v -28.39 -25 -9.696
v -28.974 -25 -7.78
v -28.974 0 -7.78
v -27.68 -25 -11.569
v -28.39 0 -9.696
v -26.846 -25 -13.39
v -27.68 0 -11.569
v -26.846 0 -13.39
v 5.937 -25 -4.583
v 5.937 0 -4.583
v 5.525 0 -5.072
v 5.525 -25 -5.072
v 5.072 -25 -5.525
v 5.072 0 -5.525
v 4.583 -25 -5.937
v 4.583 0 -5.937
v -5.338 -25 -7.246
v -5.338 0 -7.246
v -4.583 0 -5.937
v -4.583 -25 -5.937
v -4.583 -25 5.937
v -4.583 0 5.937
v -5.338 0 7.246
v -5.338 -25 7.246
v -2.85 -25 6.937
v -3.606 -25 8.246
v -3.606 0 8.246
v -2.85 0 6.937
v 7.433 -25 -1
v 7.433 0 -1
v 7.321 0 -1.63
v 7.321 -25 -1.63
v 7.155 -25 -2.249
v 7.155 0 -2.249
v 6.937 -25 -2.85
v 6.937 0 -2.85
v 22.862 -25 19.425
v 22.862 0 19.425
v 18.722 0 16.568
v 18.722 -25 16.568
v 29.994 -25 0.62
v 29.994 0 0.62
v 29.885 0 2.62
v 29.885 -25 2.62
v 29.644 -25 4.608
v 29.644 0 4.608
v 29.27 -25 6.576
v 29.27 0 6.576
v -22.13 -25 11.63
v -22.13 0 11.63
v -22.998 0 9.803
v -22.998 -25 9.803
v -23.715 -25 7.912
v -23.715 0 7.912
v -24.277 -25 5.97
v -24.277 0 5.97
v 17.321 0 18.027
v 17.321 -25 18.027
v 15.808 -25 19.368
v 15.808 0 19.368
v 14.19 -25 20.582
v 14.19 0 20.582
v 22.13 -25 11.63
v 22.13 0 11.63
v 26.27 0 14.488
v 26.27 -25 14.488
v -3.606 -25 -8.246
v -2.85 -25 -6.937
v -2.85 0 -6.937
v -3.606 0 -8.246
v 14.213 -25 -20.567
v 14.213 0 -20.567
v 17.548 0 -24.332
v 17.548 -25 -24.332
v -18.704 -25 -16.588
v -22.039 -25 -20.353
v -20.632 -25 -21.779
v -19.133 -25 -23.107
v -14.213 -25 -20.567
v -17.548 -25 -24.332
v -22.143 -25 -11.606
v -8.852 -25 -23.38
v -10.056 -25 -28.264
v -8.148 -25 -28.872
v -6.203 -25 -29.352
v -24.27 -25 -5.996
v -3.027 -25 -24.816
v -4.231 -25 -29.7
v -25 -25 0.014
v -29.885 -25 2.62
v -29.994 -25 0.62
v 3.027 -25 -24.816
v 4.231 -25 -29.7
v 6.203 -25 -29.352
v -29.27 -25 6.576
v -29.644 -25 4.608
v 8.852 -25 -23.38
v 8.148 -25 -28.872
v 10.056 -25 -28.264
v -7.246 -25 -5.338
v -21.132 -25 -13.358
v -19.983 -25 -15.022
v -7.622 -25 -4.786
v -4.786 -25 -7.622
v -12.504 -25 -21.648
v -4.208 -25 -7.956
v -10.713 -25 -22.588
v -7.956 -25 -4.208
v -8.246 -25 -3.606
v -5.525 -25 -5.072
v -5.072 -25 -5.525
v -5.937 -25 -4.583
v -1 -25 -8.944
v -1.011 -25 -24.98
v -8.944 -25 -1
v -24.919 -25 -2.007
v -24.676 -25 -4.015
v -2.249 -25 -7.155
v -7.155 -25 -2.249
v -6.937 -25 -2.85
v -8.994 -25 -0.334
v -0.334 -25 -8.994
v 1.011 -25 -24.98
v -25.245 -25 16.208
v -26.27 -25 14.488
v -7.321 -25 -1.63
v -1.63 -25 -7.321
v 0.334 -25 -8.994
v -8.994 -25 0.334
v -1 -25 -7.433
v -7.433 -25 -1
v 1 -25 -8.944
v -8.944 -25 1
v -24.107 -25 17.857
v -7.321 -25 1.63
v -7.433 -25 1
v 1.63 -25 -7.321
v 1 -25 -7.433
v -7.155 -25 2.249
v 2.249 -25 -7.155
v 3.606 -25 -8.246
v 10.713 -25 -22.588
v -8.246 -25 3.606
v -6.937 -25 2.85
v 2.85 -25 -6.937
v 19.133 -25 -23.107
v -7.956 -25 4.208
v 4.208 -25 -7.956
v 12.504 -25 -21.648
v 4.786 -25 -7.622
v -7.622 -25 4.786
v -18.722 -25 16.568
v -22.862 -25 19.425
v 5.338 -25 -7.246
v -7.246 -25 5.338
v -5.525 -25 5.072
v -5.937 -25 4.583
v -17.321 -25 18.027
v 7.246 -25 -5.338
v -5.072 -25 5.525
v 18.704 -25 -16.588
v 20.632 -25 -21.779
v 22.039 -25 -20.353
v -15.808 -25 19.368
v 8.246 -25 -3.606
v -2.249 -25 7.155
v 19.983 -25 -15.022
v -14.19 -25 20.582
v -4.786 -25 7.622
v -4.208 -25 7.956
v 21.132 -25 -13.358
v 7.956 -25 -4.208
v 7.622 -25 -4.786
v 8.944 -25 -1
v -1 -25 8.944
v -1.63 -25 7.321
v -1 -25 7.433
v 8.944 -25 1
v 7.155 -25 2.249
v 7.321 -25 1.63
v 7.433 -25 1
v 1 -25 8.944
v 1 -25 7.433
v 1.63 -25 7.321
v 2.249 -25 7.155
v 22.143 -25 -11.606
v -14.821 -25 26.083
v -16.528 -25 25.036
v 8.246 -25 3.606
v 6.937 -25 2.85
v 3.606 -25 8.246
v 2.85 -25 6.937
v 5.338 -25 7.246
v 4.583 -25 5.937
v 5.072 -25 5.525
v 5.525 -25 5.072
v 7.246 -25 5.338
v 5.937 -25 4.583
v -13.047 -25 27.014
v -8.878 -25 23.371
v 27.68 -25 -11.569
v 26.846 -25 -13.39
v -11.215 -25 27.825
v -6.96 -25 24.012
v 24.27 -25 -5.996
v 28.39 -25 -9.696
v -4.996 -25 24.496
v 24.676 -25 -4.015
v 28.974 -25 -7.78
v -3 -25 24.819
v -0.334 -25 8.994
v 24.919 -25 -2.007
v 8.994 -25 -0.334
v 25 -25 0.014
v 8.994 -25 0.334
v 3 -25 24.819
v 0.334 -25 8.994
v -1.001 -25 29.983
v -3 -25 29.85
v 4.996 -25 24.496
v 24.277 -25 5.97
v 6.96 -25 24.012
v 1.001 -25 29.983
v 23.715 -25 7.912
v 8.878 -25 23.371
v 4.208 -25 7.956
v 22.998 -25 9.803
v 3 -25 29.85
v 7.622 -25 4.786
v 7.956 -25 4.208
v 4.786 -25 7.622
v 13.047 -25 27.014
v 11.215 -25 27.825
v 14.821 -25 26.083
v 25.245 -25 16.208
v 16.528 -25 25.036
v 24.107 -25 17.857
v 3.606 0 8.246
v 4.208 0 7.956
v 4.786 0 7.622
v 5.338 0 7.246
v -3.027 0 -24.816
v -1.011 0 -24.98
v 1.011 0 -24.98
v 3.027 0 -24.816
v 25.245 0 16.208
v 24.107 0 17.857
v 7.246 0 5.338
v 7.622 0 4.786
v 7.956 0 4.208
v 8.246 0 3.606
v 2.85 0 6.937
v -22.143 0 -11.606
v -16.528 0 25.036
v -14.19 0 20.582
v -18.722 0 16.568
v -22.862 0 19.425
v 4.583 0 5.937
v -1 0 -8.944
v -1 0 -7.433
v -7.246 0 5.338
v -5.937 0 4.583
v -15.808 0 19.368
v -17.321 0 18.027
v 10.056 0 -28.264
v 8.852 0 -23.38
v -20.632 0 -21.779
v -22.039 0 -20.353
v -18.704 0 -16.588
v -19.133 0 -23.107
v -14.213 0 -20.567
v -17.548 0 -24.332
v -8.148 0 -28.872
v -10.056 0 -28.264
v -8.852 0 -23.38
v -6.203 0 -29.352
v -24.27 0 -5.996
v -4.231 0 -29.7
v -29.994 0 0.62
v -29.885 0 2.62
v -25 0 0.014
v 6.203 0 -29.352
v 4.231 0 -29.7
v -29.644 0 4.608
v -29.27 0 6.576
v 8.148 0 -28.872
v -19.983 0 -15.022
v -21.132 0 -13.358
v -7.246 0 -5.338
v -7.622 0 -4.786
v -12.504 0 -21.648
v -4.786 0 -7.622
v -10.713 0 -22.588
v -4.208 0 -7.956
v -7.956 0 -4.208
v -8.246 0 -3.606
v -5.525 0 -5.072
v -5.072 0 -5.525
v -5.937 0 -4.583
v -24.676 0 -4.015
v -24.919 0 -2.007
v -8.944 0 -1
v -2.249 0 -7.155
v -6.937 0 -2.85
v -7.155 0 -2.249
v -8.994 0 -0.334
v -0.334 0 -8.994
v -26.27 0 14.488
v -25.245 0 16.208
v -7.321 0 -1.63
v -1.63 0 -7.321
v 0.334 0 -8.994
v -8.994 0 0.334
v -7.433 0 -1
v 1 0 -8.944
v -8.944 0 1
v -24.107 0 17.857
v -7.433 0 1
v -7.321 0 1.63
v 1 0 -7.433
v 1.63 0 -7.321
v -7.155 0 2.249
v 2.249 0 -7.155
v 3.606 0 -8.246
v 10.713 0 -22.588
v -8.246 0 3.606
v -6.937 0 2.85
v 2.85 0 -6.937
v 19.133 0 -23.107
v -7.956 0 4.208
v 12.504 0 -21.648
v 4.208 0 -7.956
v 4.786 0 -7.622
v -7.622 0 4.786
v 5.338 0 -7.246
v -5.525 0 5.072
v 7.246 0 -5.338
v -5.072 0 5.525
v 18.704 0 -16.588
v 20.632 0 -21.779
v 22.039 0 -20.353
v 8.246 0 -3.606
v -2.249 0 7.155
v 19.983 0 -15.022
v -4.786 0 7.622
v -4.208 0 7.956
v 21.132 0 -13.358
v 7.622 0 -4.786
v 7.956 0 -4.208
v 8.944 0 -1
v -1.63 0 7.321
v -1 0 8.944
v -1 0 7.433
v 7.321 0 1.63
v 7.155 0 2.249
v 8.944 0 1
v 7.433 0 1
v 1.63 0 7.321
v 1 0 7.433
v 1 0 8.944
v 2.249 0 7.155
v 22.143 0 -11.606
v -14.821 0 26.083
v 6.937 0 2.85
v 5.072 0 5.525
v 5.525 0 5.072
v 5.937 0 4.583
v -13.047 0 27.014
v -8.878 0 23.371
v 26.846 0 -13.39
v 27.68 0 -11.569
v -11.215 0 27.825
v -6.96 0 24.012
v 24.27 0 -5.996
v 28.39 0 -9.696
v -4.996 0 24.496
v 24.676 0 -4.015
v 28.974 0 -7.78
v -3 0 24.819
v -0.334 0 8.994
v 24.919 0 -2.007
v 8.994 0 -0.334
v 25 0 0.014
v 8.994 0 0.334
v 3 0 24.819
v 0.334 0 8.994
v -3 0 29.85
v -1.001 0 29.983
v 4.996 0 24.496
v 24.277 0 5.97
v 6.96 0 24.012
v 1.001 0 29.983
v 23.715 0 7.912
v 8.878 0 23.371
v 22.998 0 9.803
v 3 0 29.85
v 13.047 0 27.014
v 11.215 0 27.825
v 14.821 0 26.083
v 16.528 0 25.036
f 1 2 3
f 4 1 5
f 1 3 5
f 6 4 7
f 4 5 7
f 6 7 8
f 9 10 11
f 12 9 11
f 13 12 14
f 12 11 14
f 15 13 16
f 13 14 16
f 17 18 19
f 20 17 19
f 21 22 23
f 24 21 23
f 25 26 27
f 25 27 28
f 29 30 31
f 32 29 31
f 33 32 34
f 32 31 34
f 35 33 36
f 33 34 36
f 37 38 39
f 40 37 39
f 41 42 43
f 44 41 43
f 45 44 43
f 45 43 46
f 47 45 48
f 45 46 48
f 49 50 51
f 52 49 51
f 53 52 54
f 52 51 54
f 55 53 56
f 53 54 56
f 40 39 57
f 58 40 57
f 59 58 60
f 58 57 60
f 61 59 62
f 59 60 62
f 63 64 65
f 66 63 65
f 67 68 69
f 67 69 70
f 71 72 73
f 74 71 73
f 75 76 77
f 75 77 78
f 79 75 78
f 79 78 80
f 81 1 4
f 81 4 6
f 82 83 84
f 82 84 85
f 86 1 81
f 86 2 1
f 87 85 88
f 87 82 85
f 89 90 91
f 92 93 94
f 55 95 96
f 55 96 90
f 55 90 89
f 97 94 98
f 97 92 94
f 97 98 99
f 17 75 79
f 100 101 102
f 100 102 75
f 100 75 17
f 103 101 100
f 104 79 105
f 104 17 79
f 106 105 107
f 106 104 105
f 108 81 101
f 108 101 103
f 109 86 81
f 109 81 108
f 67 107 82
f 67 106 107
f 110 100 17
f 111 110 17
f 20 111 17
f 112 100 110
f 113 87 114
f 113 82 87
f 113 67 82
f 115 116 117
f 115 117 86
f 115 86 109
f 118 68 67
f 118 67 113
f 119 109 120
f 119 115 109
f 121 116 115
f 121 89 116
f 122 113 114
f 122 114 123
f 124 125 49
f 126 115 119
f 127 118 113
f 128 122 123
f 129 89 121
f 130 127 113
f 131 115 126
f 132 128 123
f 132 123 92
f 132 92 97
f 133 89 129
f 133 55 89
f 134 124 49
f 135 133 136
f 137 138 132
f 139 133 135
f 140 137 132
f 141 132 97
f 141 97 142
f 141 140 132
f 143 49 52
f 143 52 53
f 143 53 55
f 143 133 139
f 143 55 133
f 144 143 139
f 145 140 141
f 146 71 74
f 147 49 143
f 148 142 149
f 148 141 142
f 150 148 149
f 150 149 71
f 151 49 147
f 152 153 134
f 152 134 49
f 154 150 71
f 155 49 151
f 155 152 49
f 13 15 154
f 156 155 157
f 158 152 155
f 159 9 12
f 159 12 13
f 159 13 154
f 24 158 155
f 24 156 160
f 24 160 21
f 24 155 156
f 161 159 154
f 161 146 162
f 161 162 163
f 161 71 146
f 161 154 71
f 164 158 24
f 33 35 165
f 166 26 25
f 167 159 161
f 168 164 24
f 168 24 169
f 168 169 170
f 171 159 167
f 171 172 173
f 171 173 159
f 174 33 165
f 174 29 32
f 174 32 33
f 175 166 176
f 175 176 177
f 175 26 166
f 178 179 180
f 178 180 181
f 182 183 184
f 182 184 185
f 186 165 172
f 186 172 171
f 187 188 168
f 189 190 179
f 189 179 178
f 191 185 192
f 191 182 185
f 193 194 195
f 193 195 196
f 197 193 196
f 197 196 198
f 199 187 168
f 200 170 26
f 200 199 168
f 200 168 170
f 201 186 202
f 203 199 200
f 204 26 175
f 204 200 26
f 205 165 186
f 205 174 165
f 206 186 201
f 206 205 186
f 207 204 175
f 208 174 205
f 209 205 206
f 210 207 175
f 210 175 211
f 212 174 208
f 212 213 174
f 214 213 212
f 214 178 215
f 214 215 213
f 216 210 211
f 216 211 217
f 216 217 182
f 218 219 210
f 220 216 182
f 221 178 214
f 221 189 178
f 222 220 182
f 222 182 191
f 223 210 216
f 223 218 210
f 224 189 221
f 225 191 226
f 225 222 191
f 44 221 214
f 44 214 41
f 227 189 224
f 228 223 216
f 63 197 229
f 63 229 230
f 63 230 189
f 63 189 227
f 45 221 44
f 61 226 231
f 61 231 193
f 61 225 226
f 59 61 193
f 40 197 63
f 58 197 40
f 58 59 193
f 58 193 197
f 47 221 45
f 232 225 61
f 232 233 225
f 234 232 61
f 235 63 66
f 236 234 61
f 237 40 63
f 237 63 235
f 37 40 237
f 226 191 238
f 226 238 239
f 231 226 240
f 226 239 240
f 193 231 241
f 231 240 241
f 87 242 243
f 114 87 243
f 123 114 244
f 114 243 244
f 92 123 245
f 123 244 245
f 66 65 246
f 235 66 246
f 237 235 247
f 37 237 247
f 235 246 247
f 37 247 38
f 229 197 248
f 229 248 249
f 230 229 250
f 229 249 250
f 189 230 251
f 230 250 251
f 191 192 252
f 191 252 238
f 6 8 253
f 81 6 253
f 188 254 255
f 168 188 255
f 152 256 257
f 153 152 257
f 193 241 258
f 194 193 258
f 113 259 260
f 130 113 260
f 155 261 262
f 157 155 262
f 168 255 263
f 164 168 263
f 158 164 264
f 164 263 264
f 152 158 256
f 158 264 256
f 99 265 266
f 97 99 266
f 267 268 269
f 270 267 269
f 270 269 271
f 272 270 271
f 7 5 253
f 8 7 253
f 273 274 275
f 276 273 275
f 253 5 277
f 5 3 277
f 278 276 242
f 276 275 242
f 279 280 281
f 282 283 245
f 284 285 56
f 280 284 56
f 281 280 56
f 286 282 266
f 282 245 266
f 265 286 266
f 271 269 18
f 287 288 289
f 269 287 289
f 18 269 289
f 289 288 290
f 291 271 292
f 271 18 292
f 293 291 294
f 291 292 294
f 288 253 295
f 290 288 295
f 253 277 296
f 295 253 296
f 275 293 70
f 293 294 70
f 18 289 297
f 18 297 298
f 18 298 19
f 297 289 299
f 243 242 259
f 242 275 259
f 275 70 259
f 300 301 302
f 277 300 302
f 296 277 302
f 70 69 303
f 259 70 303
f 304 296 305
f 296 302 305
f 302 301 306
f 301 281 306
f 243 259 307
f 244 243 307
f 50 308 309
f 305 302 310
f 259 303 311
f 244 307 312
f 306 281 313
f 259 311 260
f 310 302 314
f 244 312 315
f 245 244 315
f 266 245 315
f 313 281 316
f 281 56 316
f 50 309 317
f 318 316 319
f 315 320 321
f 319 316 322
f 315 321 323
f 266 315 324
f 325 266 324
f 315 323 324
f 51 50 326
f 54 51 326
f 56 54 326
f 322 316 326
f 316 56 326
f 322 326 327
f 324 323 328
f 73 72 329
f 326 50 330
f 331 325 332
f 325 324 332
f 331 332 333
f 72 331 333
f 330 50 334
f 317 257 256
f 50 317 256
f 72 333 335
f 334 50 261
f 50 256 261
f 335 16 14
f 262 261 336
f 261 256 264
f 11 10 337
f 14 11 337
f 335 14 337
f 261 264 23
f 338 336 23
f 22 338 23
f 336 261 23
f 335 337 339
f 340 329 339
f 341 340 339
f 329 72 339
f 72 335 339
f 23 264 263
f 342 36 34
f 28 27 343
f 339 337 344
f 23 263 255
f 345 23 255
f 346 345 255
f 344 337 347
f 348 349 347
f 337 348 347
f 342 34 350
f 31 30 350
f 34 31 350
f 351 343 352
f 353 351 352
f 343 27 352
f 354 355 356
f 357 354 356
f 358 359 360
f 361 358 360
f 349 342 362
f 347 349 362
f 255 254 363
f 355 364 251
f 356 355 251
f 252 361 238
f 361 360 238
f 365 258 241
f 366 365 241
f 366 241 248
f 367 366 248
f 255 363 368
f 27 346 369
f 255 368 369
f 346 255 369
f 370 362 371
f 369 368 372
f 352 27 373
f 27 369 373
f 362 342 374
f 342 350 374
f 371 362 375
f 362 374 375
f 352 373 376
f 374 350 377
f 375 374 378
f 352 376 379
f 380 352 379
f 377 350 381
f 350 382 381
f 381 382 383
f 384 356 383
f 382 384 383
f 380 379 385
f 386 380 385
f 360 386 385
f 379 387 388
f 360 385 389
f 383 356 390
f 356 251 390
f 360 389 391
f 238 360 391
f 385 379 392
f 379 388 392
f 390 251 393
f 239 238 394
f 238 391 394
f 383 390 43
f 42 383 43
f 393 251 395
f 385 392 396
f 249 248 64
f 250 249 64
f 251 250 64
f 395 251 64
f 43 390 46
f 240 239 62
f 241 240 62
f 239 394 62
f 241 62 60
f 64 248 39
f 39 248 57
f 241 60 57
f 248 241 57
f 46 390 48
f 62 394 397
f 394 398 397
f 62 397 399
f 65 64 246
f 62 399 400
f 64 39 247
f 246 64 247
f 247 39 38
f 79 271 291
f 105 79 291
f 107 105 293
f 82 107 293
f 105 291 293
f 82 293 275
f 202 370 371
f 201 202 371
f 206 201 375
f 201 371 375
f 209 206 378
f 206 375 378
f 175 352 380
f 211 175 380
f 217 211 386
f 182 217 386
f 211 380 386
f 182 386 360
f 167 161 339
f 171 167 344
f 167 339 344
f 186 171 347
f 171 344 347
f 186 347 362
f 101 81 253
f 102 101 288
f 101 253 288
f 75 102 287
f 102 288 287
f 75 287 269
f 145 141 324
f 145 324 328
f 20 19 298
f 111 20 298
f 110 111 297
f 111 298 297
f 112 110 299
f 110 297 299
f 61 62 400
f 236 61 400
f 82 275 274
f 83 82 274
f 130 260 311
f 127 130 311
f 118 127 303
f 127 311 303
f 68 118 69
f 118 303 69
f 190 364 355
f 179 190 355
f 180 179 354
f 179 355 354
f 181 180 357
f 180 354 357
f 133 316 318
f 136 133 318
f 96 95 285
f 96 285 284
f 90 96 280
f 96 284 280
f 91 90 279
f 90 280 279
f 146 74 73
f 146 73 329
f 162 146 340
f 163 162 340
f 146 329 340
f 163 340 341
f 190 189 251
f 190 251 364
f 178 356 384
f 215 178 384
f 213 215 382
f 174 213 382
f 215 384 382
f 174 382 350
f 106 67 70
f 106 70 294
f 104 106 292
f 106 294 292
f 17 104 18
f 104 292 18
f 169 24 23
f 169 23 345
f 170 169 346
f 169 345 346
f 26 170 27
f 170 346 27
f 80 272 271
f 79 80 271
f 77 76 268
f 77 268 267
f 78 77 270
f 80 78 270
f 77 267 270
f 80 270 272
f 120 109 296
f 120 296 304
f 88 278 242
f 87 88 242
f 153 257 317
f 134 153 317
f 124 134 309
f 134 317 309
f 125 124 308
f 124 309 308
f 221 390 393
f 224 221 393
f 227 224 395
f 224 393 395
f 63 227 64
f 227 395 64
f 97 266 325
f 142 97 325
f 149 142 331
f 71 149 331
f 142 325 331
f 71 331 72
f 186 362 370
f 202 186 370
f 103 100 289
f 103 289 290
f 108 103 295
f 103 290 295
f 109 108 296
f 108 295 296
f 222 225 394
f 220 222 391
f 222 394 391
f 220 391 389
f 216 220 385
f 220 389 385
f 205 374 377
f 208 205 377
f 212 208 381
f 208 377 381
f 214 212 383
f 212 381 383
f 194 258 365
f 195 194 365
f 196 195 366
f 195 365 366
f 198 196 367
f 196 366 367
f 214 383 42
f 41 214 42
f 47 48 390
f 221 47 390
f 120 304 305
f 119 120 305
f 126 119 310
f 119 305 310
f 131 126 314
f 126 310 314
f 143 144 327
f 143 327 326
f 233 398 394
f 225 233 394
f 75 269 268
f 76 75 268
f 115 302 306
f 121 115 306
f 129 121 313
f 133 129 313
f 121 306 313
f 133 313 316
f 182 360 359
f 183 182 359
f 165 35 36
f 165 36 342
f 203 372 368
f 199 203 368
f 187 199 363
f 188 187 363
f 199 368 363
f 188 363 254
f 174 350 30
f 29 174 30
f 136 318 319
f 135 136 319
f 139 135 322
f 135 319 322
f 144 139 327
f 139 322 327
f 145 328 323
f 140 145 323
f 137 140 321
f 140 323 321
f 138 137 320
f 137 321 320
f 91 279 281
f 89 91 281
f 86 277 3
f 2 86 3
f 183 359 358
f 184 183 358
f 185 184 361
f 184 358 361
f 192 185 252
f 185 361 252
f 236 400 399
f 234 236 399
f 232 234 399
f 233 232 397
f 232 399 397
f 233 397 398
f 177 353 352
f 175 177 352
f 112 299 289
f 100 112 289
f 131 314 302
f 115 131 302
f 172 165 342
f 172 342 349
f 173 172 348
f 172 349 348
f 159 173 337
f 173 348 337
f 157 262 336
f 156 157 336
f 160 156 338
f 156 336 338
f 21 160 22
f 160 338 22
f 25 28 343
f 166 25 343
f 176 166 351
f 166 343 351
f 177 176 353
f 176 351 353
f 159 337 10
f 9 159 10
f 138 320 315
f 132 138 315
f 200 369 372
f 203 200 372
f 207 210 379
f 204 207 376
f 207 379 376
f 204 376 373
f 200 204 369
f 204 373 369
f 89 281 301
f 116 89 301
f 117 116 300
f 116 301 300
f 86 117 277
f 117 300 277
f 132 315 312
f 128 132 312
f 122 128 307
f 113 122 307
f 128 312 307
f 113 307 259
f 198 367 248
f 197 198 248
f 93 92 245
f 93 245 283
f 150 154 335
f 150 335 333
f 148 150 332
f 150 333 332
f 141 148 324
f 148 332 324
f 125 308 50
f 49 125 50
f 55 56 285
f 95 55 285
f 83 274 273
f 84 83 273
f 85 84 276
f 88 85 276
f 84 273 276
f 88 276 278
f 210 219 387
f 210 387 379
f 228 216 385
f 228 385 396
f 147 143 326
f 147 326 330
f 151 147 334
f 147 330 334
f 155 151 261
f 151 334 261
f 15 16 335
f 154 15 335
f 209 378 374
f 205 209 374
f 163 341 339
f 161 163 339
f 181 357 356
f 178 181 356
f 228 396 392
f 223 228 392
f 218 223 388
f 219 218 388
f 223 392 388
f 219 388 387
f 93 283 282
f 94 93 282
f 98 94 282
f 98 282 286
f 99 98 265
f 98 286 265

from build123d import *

# Parameters (mm, degrees)
F1_DEPTH = 25


with BuildPart() as f1:
    # F0 (on Front) → F1 (new body)
    with BuildSketch(Plane.XZ):
        with BuildLine():
            Line((-16.52818, 25.036359), (-14.190494, 20.582271))
            ThreePointArc((-14.190494, 20.582271), (-16.578066, 18.712769), (-18.721728, 16.567948))
            Line((-18.721728, 16.567948), (-22.861564, 19.42547))
            ThreePointArc((-22.861564, 19.42547), (-24.689516, 17.041942), (-26.269952, 14.487567))
            Line((-26.269952, 14.487567), (-22.130117, 11.630045))
            ThreePointArc((-22.130117, 11.630045), (-23.375406, 8.865122), (-24.276776, 5.969768))
            Line((-24.276776, 5.969768), (-29.270376, 6.576101))
            ThreePointArc((-29.270376, 6.576101), (-29.781266, 3.6161), (-29.993596, 0.619848))
            Line((-29.993596, 0.619848), (-24.999996, 0.013515))
            ThreePointArc((-24.999996, 0.013515), (-24.817722, -3.013417), (-24.270308, -5.996013))
            Line((-24.270308, -5.996013), (-28.973697, -7.779774))
            ThreePointArc((-28.973697, -7.779774), (-28.050487, -10.638147), (-26.846068, -13.389871))
            Line((-26.846068, -13.389871), (-22.142678, -11.606111))
            ThreePointArc((-22.142678, -11.606111), (-20.574597, -14.201619), (-18.703804, -16.58818))
            Line((-18.703804, -16.58818), (-22.039494, -20.353396))
            ThreePointArc((-22.039494, -20.353396), (-19.89368, -22.455322), (-17.548429, -24.332132))
            Line((-17.548429, -24.332132), (-14.212739, -20.566916))
            ThreePointArc((-14.212739, -20.566916), (-11.618079, -22.136401), (-8.852484, -23.380195))
            Line((-8.852484, -23.380195), (-10.056308, -28.2643))
            ThreePointArc((-10.056308, -28.2643), (-7.17947, -29.128255), (-4.230657, -29.700194))
            Line((-4.230657, -29.700194), (-3.026833, -24.816089))
            ThreePointArc((-3.026833, -24.816089), (0, -25), (3.026833, -24.816089))
            Line((3.026833, -24.816089), (4.230657, -29.700194))
            ThreePointArc((4.230657, -29.700194), (7.17947, -29.128255), (10.056308, -28.2643))
            Line((10.056308, -28.2643), (8.852484, -23.380195))
            ThreePointArc((8.852484, -23.380195), (11.618079, -22.136401), (14.212739, -20.566916))
            Line((14.212739, -20.566916), (17.548429, -24.332132))
            ThreePointArc((17.548429, -24.332132), (19.89368, -22.455322), (22.039494, -20.353396))
            Line((22.039494, -20.353396), (18.703804, -16.58818))
            ThreePointArc((18.703804, -16.58818), (20.574597, -14.201619), (22.142678, -11.606111))
            Line((22.142678, -11.606111), (26.846068, -13.389871))
            ThreePointArc((26.846068, -13.389871), (28.050487, -10.638147), (28.973697, -7.779774))
            Line((28.973697, -7.779774), (24.270308, -5.996013))
            ThreePointArc((24.270308, -5.996013), (24.817722, -3.013417), (24.999996, 0.013515))
            Line((24.999996, 0.013515), (29.993596, 0.619848))
            ThreePointArc((29.993596, 0.619848), (29.781266, 3.6161), (29.270376, 6.576101))
            Line((29.270376, 6.576101), (24.276776, 5.969768))
            ThreePointArc((24.276776, 5.969768), (23.375406, 8.865122), (22.130117, 11.630045))
            Line((22.130117, 11.630045), (26.269952, 14.487567))
            ThreePointArc((26.269952, 14.487567), (24.689516, 17.041942), (22.861564, 19.42547))
            Line((22.861564, 19.42547), (18.721728, 16.567948))
            ThreePointArc((18.721728, 16.567948), (16.578066, 18.712769), (14.190494, 20.582271))
            Line((14.190494, 20.582271), (16.52818, 25.036359))
            ThreePointArc((16.52818, 25.036359), (13.941695, 26.563681), (11.215443, 27.824698))
            Line((11.215443, 27.824698), (8.877758, 23.37061))
            ThreePointArc((8.877758, 23.37061), (5.982892, 24.273545), (3, 24.819347))
            Line((3, 24.819347), (3, 29.849623))
            ThreePointArc((3, 29.849623), (0, 30), (-3, 29.849623))
            Line((-3, 29.849623), (-3, 24.819347))
            ThreePointArc((-3, 24.819347), (-5.982892, 24.273545), (-8.877758, 23.37061))
            Line((-8.877758, 23.37061), (-11.215443, 27.824698))
            ThreePointArc((-11.215443, 27.824698), (-13.941695, 26.563681), (-16.52818, 25.036359))
        make_face()
        with BuildLine():
            ThreePointArc((-5.937197, 4.582543), (-5.303301, 5.303301), (-4.582543, 5.937197))
            Line((-4.582543, 5.937197), (-5.338161, 7.245967))
            ThreePointArc((-5.338161, 7.245967), (-4.5, 7.794229), (-3.606111, 8.245967))
            Line((-3.606111, 8.245967), (-2.850492, 6.937197))
            ThreePointArc((-2.850492, 6.937197), (-1.941143, 7.244444), (-1, 7.433034))
            Line((-1, 7.433034), (-1, 8.944272))
            ThreePointArc((-1, 8.944272), (0, 9), (1, 8.944272))
            Line((1, 8.944272), (1, 7.433034))
            ThreePointArc((1, 7.433034), (1.941143, 7.244444), (2.850492, 6.937197))
            Line((2.850492, 6.937197), (3.606111, 8.245967))
            ThreePointArc((3.606111, 8.245967), (4.5, 7.794229), (5.338161, 7.245967))
            Line((5.338161, 7.245967), (4.582543, 5.937197))
            ThreePointArc((4.582543, 5.937197), (5.303301, 5.303301), (5.937197, 4.582543))
            Line((5.937197, 4.582543), (7.245967, 5.338161))
            ThreePointArc((7.245967, 5.338161), (7.794229, 4.5), (8.245967, 3.606111))
            Line((8.245967, 3.606111), (6.937197, 2.850492))
            ThreePointArc((6.937197, 2.850492), (7.244444, 1.941143), (7.433034, 1))
            Line((7.433034, 1), (8.944272, 1))
            ThreePointArc((8.944272, 1), (9, 0), (8.944272, -1))
            Line((8.944272, -1), (7.433034, -1))
            ThreePointArc((7.433034, -1), (7.244444, -1.941143), (6.937197, -2.850492))
            Line((6.937197, -2.850492), (8.245967, -3.606111))
            ThreePointArc((8.245967, -3.606111), (7.794229, -4.5), (7.245967, -5.338161))
            Line((7.245967, -5.338161), (5.937197, -4.582543))
            ThreePointArc((5.937197, -4.582543), (5.303301, -5.303301), (4.582543, -5.937197))
            Line((4.582543, -5.937197), (5.338161, -7.245967))
            ThreePointArc((5.338161, -7.245967), (4.5, -7.794229), (3.606111, -8.245967))
            Line((3.606111, -8.245967), (2.850492, -6.937197))
            ThreePointArc((2.850492, -6.937197), (1.941143, -7.244444), (1, -7.433034))
            Line((1, -7.433034), (1, -8.944272))
            ThreePointArc((1, -8.944272), (0, -9), (-1, -8.944272))
            Line((-1, -8.944272), (-1, -7.433034))
            ThreePointArc((-1, -7.433034), (-1.941143, -7.244444), (-2.850492, -6.937197))
            Line((-2.850492, -6.937197), (-3.606111, -8.245967))
            ThreePointArc((-3.606111, -8.245967), (-4.5, -7.794229), (-5.338161, -7.245967))
            Line((-5.338161, -7.245967), (-4.582543, -5.937197))
            ThreePointArc((-4.582543, -5.937197), (-5.303301, -5.303301), (-5.937197, -4.582543))
            Line((-5.937197, -4.582543), (-7.245967, -5.338161))
            ThreePointArc((-7.245967, -5.338161), (-7.794229, -4.5), (-8.245967, -3.606111))
            Line((-8.245967, -3.606111), (-6.937197, -2.850492))
            ThreePointArc((-6.937197, -2.850492), (-7.244444, -1.941143), (-7.433034, -1))
            Line((-7.433034, -1), (-8.944272, -1))
            ThreePointArc((-8.944272, -1), (-9, 0), (-8.944272, 1))
            Line((-8.944272, 1), (-7.433034, 1))
            ThreePointArc((-7.433034, 1), (-7.244444, 1.941143), (-6.937197, 2.850492))
            Line((-6.937197, 2.850492), (-8.245967, 3.606111))
            ThreePointArc((-8.245967, 3.606111), (-7.794229, 4.5), (-7.245967, 5.338161))
            Line((-7.245967, 5.338161), (-5.937197, 4.582543))
        make_face(mode=Mode.SUBTRACT)
    extrude(amount=F1_DEPTH)


solid = f1.part
